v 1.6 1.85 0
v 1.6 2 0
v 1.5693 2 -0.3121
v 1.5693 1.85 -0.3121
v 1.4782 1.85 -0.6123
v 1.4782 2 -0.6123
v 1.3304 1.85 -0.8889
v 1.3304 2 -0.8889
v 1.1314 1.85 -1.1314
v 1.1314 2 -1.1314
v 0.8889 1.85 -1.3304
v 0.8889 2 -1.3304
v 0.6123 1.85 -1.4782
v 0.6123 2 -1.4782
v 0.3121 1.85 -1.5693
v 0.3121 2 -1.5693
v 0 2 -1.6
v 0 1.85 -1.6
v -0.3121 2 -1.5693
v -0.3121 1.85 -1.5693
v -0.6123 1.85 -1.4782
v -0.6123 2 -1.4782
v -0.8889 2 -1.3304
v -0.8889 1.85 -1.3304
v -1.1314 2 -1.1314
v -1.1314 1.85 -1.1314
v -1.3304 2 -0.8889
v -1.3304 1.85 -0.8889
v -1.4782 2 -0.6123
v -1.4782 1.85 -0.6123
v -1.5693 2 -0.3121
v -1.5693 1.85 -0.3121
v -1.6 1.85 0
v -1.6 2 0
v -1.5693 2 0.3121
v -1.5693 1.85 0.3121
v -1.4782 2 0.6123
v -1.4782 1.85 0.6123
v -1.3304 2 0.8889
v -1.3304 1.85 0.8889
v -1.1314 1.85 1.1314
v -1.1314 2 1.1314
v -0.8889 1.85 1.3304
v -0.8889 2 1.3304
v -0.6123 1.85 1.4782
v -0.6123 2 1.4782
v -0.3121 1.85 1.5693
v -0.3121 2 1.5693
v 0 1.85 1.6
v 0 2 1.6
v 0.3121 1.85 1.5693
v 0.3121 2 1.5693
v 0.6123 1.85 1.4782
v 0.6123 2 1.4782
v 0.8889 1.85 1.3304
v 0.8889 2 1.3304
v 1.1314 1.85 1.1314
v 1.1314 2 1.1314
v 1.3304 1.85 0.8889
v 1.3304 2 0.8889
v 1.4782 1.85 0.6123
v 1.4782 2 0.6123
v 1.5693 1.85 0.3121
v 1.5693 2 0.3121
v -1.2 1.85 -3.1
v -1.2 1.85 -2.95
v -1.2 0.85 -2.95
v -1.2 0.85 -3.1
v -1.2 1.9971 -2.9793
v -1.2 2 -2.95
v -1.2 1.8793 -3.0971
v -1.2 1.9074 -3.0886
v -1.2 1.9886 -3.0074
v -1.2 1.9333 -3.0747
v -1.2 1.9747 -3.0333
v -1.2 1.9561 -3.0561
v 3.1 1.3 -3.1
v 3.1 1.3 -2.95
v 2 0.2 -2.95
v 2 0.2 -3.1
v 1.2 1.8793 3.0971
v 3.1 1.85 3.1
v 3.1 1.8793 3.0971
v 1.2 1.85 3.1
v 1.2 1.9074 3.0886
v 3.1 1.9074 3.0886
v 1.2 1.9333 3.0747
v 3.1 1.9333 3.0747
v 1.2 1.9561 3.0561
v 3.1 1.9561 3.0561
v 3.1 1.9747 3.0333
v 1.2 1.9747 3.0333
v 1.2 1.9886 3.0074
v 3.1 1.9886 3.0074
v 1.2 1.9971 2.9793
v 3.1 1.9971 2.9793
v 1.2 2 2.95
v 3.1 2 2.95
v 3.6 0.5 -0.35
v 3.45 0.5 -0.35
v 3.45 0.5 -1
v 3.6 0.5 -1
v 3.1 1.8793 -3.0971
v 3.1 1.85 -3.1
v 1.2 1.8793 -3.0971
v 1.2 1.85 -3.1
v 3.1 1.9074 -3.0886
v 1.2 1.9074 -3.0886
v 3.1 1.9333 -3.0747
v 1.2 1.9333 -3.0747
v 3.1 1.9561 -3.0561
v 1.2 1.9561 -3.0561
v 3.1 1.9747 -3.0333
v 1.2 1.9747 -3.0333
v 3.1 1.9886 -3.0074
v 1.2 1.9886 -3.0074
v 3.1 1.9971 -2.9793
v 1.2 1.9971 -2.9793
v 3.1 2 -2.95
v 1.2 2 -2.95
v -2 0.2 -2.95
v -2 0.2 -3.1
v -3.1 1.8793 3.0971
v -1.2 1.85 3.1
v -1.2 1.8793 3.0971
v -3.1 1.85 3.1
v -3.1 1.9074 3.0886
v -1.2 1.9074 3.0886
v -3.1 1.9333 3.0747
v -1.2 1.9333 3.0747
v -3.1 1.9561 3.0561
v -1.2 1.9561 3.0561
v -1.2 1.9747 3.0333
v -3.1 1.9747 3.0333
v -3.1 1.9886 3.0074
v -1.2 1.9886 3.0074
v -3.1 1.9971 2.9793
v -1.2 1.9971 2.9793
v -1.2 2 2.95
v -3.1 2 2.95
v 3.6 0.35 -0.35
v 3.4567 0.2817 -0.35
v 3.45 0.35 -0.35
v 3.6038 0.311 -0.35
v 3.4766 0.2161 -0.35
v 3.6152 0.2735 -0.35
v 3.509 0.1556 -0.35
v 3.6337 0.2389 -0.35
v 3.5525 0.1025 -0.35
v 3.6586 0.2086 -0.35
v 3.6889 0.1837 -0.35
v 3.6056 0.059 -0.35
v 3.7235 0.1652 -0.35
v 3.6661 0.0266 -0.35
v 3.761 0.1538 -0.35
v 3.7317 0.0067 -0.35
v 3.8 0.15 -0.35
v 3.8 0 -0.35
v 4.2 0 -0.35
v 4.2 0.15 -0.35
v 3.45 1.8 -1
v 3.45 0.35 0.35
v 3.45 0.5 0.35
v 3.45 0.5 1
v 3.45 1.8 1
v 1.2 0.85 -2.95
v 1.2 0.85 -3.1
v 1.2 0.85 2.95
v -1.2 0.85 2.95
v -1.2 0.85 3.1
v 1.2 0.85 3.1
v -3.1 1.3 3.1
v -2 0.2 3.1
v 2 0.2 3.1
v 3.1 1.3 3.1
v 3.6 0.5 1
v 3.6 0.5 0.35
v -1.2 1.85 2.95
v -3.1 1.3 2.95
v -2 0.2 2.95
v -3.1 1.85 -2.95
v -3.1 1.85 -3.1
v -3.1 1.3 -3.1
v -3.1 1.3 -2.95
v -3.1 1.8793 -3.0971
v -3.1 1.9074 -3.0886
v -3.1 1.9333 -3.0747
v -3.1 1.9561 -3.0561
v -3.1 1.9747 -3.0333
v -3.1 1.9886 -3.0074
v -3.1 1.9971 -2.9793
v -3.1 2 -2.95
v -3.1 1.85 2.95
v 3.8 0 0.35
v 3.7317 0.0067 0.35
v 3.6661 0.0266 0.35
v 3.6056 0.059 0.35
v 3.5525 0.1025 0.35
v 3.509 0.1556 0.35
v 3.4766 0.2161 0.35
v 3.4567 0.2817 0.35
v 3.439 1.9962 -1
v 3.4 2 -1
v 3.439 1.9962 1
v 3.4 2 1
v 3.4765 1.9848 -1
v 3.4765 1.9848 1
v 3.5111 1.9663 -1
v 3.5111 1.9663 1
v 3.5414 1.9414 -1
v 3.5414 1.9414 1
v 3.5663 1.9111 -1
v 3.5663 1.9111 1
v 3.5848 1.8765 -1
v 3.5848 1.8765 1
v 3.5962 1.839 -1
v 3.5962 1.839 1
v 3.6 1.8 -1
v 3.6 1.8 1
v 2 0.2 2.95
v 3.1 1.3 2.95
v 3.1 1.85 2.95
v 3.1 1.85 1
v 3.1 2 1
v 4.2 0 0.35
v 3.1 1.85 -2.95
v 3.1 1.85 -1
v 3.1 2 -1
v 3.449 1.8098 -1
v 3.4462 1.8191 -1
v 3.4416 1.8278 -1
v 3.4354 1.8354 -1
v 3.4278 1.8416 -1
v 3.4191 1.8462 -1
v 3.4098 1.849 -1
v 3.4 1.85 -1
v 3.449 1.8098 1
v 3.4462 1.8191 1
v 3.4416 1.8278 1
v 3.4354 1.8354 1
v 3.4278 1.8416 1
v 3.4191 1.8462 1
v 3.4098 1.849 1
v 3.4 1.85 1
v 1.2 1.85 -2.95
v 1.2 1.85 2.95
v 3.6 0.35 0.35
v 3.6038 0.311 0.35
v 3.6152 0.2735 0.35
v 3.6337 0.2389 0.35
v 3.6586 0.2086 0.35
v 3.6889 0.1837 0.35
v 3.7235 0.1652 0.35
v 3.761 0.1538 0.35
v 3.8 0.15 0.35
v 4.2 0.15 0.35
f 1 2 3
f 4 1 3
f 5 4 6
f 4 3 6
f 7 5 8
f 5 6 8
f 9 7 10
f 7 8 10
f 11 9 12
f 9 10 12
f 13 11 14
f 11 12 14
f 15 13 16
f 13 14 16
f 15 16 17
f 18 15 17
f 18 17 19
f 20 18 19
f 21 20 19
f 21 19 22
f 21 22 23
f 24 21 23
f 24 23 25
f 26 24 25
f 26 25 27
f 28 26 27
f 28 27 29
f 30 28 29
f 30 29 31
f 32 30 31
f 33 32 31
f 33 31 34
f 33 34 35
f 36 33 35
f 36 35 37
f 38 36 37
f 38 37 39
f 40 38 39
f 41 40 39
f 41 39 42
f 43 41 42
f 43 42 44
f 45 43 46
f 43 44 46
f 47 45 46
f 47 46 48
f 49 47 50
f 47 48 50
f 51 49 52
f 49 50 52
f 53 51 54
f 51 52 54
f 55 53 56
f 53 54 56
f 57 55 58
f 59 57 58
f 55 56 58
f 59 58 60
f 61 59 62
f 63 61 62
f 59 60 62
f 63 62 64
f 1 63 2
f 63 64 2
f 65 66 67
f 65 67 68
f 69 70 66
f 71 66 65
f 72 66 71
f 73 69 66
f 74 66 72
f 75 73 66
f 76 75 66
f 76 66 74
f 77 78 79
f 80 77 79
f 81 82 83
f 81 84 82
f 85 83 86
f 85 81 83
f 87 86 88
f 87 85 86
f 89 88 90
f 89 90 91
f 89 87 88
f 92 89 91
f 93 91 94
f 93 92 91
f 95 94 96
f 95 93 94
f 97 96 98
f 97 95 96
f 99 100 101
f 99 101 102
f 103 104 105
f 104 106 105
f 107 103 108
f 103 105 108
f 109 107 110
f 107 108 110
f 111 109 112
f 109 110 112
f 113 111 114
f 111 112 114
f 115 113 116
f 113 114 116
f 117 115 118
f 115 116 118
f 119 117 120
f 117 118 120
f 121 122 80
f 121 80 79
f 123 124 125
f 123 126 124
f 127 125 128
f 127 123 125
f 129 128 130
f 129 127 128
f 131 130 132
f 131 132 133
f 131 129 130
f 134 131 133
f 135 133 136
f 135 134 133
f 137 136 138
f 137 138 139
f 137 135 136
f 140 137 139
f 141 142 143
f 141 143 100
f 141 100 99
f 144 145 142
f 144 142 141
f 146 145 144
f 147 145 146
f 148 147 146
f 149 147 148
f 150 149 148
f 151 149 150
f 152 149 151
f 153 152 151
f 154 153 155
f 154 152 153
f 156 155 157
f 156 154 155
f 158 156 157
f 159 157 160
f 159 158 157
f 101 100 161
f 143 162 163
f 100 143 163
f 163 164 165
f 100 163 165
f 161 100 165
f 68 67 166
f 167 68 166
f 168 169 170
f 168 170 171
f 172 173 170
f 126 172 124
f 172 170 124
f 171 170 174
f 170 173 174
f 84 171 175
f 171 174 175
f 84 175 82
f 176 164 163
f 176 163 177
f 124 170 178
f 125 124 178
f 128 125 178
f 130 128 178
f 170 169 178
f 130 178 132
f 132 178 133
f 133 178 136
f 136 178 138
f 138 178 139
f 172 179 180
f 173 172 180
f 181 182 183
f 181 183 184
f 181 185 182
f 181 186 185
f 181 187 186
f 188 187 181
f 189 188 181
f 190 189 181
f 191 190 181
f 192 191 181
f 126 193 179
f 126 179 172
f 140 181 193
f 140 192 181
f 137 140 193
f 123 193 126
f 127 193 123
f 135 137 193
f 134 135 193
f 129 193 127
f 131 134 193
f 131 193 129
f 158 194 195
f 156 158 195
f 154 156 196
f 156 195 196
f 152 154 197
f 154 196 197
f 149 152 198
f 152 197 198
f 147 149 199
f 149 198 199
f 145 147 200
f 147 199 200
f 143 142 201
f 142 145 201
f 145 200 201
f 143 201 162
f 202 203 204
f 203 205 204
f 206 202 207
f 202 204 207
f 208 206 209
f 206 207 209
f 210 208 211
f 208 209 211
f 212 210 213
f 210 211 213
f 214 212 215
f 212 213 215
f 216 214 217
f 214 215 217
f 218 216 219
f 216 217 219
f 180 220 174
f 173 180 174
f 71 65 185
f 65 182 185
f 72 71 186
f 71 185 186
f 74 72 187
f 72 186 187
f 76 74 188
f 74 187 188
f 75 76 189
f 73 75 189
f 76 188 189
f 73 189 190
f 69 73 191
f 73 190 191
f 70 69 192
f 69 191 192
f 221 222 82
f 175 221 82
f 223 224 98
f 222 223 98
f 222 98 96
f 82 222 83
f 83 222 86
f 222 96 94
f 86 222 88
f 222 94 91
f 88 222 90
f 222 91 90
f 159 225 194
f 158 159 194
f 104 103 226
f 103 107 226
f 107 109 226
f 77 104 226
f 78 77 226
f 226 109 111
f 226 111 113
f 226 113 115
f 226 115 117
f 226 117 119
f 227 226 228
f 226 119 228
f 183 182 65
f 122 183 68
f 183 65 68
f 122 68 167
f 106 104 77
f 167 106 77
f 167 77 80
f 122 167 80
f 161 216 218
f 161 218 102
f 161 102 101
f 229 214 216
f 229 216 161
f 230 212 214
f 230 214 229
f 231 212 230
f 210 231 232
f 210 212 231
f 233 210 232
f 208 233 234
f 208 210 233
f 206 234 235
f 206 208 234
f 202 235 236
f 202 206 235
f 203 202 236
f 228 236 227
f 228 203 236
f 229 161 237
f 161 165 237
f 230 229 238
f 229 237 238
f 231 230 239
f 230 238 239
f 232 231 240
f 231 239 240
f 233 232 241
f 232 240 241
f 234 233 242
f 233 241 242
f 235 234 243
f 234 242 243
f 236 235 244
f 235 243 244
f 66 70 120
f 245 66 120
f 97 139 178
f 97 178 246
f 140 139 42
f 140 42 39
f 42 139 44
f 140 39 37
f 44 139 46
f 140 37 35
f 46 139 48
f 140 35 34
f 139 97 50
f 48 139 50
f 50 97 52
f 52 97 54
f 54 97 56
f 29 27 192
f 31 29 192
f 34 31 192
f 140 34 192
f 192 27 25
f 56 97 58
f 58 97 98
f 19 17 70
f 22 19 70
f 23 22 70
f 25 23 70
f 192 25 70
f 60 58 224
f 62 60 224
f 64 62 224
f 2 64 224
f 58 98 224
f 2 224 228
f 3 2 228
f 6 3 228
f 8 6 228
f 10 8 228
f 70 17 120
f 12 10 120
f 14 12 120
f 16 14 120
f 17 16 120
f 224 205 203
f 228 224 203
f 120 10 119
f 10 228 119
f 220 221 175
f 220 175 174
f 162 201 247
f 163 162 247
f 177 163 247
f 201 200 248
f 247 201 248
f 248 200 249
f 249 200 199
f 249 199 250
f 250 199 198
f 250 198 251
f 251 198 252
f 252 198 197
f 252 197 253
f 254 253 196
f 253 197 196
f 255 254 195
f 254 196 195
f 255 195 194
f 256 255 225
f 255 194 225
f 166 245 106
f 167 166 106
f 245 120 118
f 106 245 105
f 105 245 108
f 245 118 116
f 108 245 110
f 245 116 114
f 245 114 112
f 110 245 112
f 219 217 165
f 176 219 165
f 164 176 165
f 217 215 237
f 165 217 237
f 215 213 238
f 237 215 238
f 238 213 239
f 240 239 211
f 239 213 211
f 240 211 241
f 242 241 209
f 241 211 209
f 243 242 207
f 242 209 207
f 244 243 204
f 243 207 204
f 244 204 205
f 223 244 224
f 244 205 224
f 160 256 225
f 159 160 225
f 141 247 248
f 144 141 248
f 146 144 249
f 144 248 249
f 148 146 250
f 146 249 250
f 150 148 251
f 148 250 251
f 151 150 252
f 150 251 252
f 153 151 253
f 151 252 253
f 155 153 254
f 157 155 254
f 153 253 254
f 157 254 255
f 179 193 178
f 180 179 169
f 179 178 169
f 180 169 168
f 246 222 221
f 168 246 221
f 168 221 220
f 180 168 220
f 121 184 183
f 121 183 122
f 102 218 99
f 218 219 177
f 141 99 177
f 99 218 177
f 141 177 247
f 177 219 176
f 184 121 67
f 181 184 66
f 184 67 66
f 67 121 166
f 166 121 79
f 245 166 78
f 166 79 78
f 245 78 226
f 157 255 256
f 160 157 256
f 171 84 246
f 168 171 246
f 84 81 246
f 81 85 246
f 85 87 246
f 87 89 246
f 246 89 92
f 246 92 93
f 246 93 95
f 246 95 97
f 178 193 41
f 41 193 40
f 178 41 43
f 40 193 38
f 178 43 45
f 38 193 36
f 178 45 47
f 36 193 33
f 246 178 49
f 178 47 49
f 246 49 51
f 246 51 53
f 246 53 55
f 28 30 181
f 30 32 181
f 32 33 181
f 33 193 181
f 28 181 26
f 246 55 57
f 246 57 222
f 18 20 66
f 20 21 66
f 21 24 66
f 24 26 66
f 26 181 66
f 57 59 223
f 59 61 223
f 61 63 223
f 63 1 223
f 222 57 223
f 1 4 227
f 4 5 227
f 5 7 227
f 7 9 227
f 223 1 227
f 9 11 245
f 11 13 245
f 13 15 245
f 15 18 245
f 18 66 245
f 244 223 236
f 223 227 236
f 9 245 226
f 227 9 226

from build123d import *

# Parameters (mm, degrees)
EXTRUDE_THIN3_DEPTH     = 3.1
SKETCH2_W               = 2.4
SKETCH2_H               = 1
CUT_EXTRUDE1_DEPTH      = 4.1
CUT_EXTRUDE1_DEPTH_BACK = 4.1
SKETCH3_W               = 2.4
SKETCH3_H               = 0.15
CUT_EXTRUDE2_DEPTH      = 1
FILLET1_R               = 0.15
SKETCH4_R               = 1.6
CUT_EXTRUDE3_DEPTH      = 1
EXTRUDE_THIN4_DEPTH     = 1
SKETCH6_W               = 1
SKETCH6_H               = 0.65
CUT_EXTRUDE4_DEPTH      = 0.5


with BuildPart() as part:
    # Sketch1 → Extrude-Thin3 (new body, symmetric)
    with BuildSketch(Plane(origin=(0, 0, 0), x_dir=(0, 0, -1), z_dir=(1, 0, 0))):
        Polygon((-3.1, 0.2), (-3.1, 2), (3.1, 2), (3.1, 0.2), (2.95, 0.2), (2.95, 1.85), (-2.95, 1.85), (-2.95, 0.2), align=None)
    extrude(amount=EXTRUDE_THIN3_DEPTH, both=True)

    # Sketch2 → Cut-Extrude1 (cut, two sides)
    with BuildSketch(Plane.XY) as cut_extrude1_sk:
        with Locations((0, 1.35)):
            Rectangle(SKETCH2_W, SKETCH2_H)
        Polygon((-3.1, 1.3), (-2, 0.2), (-3.1, 0.2), align=None)
        Polygon((3.1, 0.2), (3.1, 1.3), (2, 0.2), align=None)
    extrude(amount=CUT_EXTRUDE1_DEPTH, mode=Mode.SUBTRACT)
    extrude(cut_extrude1_sk.sketch, amount=-CUT_EXTRUDE1_DEPTH_BACK, mode=Mode.SUBTRACT)

    # Sketch3 → Cut-Extrude2 (cut)
    with BuildSketch(Plane(origin=(0, 2, 0), x_dir=(1, 0, 0), z_dir=(0, 1, 0))):
        with Locations((0, 3.025)):
            Rectangle(SKETCH3_W, SKETCH3_H)
        with Locations((0, -3.025)):
            Rectangle(SKETCH3_W, SKETCH3_H)
    extrude(amount=-CUT_EXTRUDE2_DEPTH, mode=Mode.SUBTRACT)

    # Fillet1
    fillet1_edges = [part.edges().sort_by_distance(p)[0] for p in [
        (-2.15, 2, -3.1),
        (2.15, 2, -3.1),
        (-2.15, 2, 3.1),
        (2.15, 2, 3.1),
    ]]
    fillet(fillet1_edges, radius=FILLET1_R)

    # Sketch4 → Cut-Extrude3 (cut)
    with BuildSketch(Plane(origin=(0, 2, 0), x_dir=(1, 0, 0), z_dir=(0, 1, 0))):
        Circle(SKETCH4_R)
    extrude(amount=-CUT_EXTRUDE3_DEPTH, mode=Mode.SUBTRACT)

    # Sketch5 → Extrude-Thin4 (add, symmetric)
    with BuildSketch(Plane.XY):
        with BuildLine():
            Line((3.1, 2), (3.4, 2))
            ThreePointArc((3.4, 2), (3.541421356, 1.941421356), (3.6, 1.8))
            Line((3.6, 1.8), (3.6, 0.35))
            ThreePointArc((3.6, 0.35), (3.658578644, 0.208578644), (3.8, 0.15))
            Line((3.8, 0.15), (4.2, 0.15))
            Line((4.2, 0.15), (4.2, 0))
            Line((4.2, 0), (3.8, 0))
            ThreePointArc((3.8, 0), (3.552512627, 0.102512627), (3.45, 0.35))
            Line((3.45, 0.35), (3.45, 1.8))
            ThreePointArc((3.45, 1.8), (3.435355339, 1.835355339), (3.4, 1.85))
            Line((3.4, 1.85), (3.1, 1.85))
            Line((3.1, 1.85), (3.1, 2))
        make_face()
    extrude(amount=EXTRUDE_THIN4_DEPTH, both=True)

    # Sketch6 → Cut-Extrude4 (cut)
    with BuildSketch(Plane.XZ):
        with Locations((3.7, 0.675)):
            Rectangle(SKETCH6_W, SKETCH6_H)
        with Locations((3.7, -0.675)):
            Rectangle(SKETCH6_W, SKETCH6_H)
    extrude(amount=-CUT_EXTRUDE4_DEPTH, mode=Mode.SUBTRACT)


solid = part.part
